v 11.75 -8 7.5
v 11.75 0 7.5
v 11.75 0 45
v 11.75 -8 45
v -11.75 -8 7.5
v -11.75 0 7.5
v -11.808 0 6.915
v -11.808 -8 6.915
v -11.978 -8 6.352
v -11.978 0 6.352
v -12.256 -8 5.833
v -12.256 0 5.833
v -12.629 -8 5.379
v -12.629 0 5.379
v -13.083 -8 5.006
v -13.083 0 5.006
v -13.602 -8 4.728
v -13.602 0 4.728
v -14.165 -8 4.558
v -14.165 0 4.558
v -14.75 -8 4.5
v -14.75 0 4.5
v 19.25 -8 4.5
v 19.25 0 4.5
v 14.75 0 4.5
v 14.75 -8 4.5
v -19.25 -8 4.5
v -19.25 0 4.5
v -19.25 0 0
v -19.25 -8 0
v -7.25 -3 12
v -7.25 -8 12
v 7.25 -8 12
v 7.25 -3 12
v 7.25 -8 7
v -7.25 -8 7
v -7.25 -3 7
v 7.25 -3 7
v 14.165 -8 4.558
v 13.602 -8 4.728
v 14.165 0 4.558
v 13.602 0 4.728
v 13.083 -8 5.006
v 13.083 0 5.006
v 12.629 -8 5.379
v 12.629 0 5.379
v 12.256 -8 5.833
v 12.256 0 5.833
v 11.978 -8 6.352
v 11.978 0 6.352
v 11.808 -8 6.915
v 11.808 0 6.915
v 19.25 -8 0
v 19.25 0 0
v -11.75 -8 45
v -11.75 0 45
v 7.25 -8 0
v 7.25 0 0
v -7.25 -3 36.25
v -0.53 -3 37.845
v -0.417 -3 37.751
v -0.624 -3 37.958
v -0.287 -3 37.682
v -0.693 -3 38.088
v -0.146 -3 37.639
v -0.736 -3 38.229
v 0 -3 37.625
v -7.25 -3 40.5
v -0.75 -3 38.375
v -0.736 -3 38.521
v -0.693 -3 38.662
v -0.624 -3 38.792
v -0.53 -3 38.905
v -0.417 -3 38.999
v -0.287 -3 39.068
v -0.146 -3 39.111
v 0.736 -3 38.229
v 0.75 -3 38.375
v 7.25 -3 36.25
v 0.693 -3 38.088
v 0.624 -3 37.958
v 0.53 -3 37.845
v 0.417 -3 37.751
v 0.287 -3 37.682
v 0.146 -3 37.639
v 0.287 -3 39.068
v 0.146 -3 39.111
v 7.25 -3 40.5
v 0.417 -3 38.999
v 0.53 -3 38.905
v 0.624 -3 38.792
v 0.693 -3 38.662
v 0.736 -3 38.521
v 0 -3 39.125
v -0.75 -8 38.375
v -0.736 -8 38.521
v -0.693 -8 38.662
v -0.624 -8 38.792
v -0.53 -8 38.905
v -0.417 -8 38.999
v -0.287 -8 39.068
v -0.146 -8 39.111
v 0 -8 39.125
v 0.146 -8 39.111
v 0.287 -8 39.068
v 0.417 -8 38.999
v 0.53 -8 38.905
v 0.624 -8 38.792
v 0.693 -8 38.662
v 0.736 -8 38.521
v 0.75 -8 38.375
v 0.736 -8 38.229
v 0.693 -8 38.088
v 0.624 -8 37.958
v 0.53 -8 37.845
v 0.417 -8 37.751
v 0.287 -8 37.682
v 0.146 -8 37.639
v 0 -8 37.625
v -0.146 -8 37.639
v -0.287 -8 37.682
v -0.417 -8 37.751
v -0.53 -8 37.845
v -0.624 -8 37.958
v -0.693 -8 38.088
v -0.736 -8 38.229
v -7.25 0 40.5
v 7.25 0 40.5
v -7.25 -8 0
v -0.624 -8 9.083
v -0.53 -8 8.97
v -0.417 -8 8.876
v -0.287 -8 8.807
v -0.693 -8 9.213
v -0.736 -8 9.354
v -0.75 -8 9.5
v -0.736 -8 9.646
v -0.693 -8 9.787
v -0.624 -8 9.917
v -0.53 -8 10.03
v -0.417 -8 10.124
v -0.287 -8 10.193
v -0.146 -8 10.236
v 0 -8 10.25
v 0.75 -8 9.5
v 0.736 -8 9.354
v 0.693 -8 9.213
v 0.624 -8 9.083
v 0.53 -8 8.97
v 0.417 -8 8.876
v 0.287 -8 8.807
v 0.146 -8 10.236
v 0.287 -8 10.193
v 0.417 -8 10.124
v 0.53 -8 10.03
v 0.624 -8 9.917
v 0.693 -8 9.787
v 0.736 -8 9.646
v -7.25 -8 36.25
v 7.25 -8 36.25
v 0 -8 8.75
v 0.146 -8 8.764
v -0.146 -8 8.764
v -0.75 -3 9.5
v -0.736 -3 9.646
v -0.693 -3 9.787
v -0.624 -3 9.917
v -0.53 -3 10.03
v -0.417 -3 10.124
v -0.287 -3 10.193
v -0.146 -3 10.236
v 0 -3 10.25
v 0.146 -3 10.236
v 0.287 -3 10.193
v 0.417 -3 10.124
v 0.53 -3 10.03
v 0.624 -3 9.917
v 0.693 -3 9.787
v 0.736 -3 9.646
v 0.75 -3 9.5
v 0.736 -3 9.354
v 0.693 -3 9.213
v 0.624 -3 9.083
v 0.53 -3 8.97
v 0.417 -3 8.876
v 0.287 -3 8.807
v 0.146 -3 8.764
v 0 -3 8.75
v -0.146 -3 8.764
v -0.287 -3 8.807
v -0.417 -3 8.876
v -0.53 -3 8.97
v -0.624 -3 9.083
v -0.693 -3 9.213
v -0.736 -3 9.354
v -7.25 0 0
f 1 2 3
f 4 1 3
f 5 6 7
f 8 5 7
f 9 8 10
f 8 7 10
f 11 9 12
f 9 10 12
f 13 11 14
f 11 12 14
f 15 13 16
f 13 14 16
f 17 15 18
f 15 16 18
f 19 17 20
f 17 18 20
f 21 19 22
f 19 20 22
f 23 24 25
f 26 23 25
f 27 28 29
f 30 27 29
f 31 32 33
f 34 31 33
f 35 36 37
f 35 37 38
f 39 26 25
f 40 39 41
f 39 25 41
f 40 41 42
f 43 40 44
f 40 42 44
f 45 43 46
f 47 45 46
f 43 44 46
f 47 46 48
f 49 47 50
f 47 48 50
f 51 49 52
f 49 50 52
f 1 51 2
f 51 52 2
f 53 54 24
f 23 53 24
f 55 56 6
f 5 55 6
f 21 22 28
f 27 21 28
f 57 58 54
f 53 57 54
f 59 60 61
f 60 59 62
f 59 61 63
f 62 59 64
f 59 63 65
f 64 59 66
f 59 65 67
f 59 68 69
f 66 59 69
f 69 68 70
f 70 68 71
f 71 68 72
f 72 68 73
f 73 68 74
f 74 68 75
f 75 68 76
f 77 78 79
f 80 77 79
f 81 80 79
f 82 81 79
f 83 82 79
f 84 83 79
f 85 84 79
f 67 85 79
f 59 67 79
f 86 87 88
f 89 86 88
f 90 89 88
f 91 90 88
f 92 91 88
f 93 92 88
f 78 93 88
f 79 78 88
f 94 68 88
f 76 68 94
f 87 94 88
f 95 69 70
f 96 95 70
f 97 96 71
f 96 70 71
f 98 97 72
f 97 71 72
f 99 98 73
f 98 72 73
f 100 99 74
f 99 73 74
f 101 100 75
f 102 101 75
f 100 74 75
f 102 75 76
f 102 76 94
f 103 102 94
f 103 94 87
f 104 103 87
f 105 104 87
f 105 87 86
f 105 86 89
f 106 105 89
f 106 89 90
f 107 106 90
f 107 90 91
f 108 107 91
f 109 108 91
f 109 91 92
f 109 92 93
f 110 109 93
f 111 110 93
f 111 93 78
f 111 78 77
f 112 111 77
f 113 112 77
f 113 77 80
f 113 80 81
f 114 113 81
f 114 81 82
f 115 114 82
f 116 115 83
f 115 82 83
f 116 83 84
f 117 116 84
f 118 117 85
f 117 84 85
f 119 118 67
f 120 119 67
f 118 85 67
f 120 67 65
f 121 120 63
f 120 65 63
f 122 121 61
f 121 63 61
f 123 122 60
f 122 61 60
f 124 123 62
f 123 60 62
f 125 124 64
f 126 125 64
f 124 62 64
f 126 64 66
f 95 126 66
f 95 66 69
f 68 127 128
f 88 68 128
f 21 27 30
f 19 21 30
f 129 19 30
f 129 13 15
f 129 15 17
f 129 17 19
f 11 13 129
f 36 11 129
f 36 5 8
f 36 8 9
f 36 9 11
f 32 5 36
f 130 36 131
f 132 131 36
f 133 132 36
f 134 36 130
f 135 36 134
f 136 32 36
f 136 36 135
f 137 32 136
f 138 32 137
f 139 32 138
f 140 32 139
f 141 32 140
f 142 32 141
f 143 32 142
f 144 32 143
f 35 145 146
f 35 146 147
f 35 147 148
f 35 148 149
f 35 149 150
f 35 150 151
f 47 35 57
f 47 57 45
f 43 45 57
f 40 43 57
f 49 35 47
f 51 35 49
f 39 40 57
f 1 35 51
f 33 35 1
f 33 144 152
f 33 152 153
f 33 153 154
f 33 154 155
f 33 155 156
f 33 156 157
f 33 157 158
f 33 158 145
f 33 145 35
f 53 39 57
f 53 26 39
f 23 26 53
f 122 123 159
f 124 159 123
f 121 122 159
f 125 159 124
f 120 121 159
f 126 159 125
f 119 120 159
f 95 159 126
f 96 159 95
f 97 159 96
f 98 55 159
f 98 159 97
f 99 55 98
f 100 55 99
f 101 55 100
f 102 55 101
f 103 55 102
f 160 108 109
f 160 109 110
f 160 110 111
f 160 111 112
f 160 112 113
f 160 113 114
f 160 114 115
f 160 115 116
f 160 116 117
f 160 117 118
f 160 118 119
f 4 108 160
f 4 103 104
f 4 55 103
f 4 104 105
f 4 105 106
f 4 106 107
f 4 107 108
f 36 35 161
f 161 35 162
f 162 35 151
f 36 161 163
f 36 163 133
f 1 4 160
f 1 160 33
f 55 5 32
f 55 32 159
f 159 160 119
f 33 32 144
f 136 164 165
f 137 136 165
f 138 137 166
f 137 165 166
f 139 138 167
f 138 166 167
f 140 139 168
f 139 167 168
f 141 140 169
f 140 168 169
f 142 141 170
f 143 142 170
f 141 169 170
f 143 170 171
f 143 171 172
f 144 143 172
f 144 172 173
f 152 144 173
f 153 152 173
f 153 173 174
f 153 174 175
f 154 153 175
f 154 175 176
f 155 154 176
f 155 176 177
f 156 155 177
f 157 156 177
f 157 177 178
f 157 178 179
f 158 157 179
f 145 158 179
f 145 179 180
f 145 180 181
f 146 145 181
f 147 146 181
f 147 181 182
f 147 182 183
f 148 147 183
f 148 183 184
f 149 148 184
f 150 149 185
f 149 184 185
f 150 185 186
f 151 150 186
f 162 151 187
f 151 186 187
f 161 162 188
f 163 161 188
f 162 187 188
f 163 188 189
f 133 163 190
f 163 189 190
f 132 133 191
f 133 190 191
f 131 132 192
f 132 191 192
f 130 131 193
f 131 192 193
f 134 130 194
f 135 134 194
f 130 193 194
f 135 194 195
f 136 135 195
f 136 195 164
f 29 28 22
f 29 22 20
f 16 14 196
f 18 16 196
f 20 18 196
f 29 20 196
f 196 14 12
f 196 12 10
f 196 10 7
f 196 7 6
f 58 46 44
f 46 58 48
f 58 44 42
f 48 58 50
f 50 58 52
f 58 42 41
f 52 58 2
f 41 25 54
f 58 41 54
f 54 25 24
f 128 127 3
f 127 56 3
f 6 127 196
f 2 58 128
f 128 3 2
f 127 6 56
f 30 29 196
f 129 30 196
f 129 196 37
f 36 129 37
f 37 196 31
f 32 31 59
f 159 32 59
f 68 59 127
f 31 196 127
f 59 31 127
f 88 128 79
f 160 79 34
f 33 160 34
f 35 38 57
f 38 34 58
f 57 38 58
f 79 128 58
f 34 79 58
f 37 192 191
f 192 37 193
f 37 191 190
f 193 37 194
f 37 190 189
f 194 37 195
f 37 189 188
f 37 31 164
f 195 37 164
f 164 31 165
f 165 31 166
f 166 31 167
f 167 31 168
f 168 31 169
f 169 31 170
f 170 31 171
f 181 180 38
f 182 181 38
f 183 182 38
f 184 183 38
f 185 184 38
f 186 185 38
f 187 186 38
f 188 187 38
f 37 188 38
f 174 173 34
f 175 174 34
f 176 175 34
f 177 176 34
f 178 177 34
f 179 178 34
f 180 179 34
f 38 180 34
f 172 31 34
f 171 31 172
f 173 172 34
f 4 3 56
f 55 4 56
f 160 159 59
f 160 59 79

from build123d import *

# Parameters (mm, degrees)
F1_DEPTH = 8
F2_W     = 14.5
F2_H     = 4.25
F2_H_2   = 5
F3_DEPTH = 5
F4_R     = 0.75
F5_DEPTH = 5.001


with BuildPart() as f1:
    # F0 (on Front) → F1 (new body)
    with BuildSketch(Plane.XZ):
        with BuildLine():
            Line((-19.25, 4.5), (-19.25, 0))
            Line((-19.25, 0), (-7.25, 0))
            Line((-7.25, 0), (-7.25, 40.5))
            Line((-7.25, 40.5), (7.25, 40.5))
            Line((7.25, 40.5), (7.25, 0))
            Line((7.25, 0), (19.25, 0))
            Line((19.25, 0), (19.25, 4.5))
            Line((19.25, 4.5), (14.75, 4.5))
            ThreePointArc((14.75, 4.5), (12.62868, 5.37868), (11.75, 7.5))
            Line((11.75, 7.5), (11.75, 45))
            Line((11.75, 45), (-11.75, 45))
            Line((-11.75, 45), (-11.75, 7.5))
            ThreePointArc((-11.75, 7.5), (-12.62868, 5.37868), (-14.75, 4.5))
            Line((-14.75, 4.5), (-19.25, 4.5))
        make_face()
    extrude(amount=F1_DEPTH)

    # F2 (on face) → F3 (join)
    with BuildSketch(Plane.XZ.offset(8)):
        with Locations((0, 38.375)):
            Rectangle(F2_W, F2_H)
        with Locations((0, 9.5)):
            Rectangle(F2_W, F2_H_2)
    extrude(amount=-F3_DEPTH)

    # F4 (on face) → F5 (cut, through all)
    with BuildSketch(Plane(origin=(0, -3, 0), x_dir=(-1, 0, 0), z_dir=(0, 1, 0))):
        with Locations((0, 38.375)):
            Circle(F4_R)
        with Locations((0, 9.5)):
            Circle(F4_R)
    extrude(amount=-F5_DEPTH, mode=Mode.SUBTRACT)


solid = f1.part
